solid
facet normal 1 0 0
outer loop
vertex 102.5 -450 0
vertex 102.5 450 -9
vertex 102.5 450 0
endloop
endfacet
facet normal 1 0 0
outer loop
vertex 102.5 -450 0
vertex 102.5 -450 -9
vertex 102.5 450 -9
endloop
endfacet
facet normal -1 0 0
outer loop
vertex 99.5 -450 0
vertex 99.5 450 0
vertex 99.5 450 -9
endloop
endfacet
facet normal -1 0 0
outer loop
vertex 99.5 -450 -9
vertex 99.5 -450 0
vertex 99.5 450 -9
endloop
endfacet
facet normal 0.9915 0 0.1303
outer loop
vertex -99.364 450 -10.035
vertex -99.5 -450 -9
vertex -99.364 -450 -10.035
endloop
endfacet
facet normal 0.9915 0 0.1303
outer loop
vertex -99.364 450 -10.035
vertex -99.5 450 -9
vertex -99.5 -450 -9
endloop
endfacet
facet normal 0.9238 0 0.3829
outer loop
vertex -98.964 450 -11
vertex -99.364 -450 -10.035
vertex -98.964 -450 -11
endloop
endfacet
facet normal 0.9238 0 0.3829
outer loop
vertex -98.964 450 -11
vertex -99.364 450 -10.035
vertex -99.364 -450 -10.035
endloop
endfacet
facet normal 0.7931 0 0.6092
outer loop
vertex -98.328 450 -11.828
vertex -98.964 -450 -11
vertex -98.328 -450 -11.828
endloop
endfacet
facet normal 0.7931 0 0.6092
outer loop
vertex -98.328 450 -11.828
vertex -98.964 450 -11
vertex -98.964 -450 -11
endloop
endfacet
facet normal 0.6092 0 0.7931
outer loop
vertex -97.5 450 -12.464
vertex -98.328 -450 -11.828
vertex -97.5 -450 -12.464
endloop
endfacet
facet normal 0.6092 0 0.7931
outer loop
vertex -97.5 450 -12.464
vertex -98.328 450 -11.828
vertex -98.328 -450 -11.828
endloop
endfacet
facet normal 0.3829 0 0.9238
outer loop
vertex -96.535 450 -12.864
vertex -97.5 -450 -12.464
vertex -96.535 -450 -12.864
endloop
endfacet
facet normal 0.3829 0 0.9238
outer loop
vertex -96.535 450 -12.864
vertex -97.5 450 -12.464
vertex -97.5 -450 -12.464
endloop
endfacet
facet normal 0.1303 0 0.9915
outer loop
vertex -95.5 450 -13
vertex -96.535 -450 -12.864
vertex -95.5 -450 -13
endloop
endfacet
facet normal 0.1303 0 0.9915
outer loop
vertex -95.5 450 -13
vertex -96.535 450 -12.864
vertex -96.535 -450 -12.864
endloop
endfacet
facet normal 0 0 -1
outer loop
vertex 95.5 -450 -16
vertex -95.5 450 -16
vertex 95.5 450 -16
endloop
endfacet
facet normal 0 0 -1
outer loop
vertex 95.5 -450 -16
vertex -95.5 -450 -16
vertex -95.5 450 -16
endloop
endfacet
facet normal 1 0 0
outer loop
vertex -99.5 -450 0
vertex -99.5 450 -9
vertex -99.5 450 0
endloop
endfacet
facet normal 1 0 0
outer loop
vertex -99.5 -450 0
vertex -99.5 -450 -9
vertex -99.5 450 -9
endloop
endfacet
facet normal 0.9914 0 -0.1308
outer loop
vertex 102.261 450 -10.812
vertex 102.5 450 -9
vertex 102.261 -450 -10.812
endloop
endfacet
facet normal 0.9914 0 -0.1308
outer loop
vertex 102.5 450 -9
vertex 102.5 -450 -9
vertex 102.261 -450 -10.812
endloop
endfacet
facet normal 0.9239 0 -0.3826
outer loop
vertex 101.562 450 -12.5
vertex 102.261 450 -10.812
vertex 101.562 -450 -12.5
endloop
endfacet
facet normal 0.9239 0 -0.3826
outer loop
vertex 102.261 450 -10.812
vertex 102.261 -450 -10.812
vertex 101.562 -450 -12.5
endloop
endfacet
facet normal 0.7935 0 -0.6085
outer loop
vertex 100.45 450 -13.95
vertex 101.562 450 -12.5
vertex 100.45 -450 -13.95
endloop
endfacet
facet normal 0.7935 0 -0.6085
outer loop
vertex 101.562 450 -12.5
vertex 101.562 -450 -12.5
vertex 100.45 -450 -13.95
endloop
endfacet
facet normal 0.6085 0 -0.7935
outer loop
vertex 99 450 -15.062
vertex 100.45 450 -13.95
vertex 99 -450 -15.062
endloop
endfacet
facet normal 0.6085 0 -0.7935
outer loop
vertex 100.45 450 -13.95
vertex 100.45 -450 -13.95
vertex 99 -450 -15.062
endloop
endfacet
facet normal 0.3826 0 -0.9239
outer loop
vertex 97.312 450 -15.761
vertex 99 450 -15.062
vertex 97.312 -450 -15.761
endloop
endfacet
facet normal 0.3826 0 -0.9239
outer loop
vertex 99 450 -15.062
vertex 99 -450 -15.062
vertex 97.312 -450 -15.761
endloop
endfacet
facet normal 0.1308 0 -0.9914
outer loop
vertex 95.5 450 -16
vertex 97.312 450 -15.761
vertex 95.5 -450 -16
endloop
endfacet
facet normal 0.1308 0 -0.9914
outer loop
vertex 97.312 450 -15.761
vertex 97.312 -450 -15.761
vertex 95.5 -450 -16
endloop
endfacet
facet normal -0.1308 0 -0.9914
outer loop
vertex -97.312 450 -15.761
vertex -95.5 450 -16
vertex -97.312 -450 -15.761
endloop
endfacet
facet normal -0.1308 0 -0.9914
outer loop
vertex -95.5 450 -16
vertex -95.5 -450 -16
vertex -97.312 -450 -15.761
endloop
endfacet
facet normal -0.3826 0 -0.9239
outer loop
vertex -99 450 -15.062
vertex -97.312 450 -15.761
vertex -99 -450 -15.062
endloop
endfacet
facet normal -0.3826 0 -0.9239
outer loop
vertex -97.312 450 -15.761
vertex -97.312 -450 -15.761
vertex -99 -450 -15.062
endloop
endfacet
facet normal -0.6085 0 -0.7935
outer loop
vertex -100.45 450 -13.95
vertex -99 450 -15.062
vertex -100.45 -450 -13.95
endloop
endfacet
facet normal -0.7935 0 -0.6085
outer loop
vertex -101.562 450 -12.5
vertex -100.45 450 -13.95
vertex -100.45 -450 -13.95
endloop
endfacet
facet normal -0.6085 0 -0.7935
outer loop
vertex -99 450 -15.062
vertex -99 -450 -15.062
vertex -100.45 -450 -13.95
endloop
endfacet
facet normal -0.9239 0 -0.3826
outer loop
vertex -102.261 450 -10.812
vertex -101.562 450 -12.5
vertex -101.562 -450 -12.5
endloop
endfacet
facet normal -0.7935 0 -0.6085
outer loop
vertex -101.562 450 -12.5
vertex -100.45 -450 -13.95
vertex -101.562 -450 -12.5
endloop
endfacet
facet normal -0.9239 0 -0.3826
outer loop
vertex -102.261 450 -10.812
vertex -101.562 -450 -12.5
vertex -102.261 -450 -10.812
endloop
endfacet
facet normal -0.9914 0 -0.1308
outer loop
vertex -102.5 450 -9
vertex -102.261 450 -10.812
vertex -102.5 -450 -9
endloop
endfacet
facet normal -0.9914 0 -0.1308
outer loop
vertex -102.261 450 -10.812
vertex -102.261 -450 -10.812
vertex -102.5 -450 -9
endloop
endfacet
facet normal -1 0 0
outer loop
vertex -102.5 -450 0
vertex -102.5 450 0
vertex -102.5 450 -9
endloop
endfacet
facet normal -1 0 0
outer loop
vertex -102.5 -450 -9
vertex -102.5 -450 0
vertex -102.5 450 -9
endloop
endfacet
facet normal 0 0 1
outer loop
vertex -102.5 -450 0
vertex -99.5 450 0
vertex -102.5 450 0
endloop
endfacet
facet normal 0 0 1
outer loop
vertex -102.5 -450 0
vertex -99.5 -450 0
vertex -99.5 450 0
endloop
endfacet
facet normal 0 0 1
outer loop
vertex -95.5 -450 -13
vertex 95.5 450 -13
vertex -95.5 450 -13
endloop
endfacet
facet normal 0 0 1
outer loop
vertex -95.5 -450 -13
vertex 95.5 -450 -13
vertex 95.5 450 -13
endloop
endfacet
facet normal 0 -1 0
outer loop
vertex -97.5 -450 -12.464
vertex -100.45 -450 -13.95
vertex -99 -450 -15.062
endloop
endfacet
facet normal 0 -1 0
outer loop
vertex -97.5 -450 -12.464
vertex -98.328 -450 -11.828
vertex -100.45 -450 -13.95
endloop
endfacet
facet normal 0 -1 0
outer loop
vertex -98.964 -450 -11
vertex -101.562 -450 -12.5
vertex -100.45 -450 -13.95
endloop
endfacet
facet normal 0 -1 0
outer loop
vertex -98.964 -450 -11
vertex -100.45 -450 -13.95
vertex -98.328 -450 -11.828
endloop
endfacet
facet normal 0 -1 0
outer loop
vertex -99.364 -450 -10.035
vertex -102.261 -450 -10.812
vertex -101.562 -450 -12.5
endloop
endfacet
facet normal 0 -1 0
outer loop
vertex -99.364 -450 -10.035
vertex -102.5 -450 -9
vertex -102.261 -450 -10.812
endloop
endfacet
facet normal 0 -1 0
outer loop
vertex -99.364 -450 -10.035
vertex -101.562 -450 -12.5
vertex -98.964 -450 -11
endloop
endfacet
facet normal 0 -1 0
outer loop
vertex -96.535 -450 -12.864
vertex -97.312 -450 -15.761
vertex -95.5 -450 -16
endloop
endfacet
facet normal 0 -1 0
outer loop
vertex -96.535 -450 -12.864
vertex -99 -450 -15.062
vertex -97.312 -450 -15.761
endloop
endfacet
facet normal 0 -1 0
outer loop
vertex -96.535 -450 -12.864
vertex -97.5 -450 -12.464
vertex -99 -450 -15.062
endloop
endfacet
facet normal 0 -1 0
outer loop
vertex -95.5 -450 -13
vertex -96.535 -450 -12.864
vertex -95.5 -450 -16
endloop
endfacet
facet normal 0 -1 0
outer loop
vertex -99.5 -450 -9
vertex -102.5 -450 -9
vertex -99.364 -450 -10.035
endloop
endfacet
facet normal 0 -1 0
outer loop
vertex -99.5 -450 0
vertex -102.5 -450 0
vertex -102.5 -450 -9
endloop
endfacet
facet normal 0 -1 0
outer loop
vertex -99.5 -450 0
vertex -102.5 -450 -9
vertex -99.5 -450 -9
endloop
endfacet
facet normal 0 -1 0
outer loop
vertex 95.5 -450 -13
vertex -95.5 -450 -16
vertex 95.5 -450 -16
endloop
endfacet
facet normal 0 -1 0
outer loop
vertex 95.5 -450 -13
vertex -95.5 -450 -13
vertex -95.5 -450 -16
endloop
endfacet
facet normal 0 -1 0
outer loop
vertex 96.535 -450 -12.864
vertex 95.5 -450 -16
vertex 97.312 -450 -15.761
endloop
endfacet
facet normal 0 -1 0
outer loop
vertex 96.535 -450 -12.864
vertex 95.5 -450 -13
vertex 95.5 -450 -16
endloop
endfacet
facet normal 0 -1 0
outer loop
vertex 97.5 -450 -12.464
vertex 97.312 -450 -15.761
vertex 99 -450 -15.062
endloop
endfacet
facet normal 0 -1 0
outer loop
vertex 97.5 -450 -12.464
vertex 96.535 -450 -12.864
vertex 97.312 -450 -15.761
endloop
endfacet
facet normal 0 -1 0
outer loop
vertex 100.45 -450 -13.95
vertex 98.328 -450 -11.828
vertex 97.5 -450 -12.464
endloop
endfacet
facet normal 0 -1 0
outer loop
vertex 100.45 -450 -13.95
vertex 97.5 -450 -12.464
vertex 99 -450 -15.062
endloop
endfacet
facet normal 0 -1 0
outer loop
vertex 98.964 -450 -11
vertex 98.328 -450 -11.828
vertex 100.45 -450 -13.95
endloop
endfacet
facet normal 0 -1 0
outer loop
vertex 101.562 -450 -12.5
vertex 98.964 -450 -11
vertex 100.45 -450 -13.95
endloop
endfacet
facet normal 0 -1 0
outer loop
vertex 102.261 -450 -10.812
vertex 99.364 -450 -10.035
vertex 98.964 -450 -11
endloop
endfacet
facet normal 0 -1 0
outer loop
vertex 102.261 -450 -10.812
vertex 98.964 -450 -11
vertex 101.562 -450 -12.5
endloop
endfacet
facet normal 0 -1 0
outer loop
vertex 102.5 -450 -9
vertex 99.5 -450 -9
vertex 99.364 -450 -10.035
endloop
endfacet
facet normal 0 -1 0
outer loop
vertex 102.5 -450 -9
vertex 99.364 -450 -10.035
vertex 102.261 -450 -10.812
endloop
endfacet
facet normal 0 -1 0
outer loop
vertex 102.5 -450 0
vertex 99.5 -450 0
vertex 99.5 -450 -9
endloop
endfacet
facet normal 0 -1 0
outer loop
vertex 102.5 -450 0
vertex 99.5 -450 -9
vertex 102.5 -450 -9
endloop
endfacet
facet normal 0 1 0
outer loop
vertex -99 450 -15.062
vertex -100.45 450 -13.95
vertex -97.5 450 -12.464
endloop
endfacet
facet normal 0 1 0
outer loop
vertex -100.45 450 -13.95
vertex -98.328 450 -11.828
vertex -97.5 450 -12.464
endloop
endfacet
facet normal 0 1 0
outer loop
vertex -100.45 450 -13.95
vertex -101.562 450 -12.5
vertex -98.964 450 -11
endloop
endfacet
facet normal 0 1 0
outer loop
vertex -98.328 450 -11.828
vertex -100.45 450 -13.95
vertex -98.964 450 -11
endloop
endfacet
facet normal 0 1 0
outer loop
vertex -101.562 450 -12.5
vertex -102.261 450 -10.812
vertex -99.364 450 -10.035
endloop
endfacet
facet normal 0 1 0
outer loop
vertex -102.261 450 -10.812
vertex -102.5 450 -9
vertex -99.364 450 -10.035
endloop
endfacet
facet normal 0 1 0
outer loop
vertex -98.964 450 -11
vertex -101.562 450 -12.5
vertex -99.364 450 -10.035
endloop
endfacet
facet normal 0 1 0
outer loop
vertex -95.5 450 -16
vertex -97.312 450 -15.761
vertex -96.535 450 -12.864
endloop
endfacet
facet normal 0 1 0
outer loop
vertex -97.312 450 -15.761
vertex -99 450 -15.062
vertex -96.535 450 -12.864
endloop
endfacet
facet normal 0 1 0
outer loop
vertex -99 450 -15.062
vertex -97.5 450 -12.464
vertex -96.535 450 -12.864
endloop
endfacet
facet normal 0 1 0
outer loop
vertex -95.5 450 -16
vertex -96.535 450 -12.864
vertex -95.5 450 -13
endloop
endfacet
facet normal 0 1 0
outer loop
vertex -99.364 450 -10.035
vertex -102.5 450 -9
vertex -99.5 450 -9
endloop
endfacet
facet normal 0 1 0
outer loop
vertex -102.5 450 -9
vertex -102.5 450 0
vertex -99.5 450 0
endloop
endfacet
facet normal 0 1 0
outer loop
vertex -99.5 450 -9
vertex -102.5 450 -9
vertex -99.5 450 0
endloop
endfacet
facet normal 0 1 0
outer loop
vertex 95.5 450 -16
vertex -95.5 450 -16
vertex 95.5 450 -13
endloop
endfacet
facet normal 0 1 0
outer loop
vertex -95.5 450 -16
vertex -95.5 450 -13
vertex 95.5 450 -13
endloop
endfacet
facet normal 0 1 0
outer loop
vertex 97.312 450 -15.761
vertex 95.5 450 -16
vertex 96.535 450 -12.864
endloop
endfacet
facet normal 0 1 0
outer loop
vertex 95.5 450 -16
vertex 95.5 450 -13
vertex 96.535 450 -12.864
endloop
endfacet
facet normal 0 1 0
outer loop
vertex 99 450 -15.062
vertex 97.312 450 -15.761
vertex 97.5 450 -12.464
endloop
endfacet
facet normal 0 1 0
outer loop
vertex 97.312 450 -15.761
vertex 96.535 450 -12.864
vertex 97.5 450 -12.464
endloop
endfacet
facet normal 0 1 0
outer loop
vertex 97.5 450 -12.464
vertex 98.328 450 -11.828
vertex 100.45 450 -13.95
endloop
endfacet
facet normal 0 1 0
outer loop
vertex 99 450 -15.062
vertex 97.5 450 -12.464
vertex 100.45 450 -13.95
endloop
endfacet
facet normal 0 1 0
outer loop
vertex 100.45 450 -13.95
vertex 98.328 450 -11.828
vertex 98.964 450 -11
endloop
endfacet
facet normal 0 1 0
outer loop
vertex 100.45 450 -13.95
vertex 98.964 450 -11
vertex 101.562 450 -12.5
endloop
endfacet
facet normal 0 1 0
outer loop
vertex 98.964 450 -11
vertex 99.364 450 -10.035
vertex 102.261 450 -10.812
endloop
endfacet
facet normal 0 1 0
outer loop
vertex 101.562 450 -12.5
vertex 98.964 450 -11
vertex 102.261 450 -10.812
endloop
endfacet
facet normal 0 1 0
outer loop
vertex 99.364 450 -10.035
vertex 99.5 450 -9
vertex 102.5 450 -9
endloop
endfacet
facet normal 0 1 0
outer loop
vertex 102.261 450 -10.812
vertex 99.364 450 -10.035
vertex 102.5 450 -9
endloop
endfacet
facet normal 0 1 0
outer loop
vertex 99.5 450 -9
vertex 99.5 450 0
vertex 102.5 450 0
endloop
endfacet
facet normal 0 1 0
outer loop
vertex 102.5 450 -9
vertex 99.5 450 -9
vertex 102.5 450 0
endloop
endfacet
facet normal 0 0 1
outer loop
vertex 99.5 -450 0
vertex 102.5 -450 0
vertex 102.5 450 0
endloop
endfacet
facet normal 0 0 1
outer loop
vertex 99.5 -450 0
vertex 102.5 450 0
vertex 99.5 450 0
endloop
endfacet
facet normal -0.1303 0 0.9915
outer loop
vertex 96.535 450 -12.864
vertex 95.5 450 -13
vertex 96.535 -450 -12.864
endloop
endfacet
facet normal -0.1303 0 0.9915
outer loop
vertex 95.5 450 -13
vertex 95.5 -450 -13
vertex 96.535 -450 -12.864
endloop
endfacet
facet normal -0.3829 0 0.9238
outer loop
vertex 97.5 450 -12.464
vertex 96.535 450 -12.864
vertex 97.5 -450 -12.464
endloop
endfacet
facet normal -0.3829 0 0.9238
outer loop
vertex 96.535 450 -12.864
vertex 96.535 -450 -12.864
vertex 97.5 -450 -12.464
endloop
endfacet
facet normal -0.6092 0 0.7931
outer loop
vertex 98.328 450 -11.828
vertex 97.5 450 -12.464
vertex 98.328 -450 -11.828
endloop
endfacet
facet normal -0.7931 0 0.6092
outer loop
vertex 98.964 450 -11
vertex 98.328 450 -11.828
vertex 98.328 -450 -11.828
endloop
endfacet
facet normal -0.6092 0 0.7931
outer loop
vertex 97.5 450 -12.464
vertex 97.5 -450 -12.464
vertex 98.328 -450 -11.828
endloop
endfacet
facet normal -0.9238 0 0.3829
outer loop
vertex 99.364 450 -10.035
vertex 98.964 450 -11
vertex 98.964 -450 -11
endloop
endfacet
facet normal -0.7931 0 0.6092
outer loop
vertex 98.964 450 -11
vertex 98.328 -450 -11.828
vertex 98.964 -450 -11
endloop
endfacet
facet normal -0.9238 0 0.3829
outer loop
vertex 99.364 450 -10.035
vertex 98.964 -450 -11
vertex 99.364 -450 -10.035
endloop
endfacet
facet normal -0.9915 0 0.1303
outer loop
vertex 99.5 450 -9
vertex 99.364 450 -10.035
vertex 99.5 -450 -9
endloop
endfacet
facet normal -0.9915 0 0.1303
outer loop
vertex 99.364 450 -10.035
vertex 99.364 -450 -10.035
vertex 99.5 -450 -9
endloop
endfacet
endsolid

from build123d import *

# Parameters (mm, degrees)
F1_DEPTH = 450
F2_R     = 4
F3_R     = 7


with BuildPart() as f1:
    # F0 (on Front) → F1 (new body, symmetric)
    with BuildSketch(Plane.XZ):
        Polygon((-102.5, 0), (-102.5, -16), (102.5, -16), (102.5, 0), (99.5, 0), (99.5, -13), (-99.5, -13), (-99.5, 0), align=None)
    extrude(amount=F1_DEPTH, both=True)

    # F2
    f2_edges = [f1.edges().sort_by_distance(p)[0] for p in [
        (-99.5, 0, -13),
        (99.5, 0, -13),
    ]]
    fillet(f2_edges, radius=F2_R)

    # F3
    f3_edges = [f1.edges().sort_by_distance(p)[0] for p in [
        (-102.5, 0, -16),
        (102.5, 0, -16),
    ]]
    fillet(f3_edges, radius=F3_R)


solid = f1.part
